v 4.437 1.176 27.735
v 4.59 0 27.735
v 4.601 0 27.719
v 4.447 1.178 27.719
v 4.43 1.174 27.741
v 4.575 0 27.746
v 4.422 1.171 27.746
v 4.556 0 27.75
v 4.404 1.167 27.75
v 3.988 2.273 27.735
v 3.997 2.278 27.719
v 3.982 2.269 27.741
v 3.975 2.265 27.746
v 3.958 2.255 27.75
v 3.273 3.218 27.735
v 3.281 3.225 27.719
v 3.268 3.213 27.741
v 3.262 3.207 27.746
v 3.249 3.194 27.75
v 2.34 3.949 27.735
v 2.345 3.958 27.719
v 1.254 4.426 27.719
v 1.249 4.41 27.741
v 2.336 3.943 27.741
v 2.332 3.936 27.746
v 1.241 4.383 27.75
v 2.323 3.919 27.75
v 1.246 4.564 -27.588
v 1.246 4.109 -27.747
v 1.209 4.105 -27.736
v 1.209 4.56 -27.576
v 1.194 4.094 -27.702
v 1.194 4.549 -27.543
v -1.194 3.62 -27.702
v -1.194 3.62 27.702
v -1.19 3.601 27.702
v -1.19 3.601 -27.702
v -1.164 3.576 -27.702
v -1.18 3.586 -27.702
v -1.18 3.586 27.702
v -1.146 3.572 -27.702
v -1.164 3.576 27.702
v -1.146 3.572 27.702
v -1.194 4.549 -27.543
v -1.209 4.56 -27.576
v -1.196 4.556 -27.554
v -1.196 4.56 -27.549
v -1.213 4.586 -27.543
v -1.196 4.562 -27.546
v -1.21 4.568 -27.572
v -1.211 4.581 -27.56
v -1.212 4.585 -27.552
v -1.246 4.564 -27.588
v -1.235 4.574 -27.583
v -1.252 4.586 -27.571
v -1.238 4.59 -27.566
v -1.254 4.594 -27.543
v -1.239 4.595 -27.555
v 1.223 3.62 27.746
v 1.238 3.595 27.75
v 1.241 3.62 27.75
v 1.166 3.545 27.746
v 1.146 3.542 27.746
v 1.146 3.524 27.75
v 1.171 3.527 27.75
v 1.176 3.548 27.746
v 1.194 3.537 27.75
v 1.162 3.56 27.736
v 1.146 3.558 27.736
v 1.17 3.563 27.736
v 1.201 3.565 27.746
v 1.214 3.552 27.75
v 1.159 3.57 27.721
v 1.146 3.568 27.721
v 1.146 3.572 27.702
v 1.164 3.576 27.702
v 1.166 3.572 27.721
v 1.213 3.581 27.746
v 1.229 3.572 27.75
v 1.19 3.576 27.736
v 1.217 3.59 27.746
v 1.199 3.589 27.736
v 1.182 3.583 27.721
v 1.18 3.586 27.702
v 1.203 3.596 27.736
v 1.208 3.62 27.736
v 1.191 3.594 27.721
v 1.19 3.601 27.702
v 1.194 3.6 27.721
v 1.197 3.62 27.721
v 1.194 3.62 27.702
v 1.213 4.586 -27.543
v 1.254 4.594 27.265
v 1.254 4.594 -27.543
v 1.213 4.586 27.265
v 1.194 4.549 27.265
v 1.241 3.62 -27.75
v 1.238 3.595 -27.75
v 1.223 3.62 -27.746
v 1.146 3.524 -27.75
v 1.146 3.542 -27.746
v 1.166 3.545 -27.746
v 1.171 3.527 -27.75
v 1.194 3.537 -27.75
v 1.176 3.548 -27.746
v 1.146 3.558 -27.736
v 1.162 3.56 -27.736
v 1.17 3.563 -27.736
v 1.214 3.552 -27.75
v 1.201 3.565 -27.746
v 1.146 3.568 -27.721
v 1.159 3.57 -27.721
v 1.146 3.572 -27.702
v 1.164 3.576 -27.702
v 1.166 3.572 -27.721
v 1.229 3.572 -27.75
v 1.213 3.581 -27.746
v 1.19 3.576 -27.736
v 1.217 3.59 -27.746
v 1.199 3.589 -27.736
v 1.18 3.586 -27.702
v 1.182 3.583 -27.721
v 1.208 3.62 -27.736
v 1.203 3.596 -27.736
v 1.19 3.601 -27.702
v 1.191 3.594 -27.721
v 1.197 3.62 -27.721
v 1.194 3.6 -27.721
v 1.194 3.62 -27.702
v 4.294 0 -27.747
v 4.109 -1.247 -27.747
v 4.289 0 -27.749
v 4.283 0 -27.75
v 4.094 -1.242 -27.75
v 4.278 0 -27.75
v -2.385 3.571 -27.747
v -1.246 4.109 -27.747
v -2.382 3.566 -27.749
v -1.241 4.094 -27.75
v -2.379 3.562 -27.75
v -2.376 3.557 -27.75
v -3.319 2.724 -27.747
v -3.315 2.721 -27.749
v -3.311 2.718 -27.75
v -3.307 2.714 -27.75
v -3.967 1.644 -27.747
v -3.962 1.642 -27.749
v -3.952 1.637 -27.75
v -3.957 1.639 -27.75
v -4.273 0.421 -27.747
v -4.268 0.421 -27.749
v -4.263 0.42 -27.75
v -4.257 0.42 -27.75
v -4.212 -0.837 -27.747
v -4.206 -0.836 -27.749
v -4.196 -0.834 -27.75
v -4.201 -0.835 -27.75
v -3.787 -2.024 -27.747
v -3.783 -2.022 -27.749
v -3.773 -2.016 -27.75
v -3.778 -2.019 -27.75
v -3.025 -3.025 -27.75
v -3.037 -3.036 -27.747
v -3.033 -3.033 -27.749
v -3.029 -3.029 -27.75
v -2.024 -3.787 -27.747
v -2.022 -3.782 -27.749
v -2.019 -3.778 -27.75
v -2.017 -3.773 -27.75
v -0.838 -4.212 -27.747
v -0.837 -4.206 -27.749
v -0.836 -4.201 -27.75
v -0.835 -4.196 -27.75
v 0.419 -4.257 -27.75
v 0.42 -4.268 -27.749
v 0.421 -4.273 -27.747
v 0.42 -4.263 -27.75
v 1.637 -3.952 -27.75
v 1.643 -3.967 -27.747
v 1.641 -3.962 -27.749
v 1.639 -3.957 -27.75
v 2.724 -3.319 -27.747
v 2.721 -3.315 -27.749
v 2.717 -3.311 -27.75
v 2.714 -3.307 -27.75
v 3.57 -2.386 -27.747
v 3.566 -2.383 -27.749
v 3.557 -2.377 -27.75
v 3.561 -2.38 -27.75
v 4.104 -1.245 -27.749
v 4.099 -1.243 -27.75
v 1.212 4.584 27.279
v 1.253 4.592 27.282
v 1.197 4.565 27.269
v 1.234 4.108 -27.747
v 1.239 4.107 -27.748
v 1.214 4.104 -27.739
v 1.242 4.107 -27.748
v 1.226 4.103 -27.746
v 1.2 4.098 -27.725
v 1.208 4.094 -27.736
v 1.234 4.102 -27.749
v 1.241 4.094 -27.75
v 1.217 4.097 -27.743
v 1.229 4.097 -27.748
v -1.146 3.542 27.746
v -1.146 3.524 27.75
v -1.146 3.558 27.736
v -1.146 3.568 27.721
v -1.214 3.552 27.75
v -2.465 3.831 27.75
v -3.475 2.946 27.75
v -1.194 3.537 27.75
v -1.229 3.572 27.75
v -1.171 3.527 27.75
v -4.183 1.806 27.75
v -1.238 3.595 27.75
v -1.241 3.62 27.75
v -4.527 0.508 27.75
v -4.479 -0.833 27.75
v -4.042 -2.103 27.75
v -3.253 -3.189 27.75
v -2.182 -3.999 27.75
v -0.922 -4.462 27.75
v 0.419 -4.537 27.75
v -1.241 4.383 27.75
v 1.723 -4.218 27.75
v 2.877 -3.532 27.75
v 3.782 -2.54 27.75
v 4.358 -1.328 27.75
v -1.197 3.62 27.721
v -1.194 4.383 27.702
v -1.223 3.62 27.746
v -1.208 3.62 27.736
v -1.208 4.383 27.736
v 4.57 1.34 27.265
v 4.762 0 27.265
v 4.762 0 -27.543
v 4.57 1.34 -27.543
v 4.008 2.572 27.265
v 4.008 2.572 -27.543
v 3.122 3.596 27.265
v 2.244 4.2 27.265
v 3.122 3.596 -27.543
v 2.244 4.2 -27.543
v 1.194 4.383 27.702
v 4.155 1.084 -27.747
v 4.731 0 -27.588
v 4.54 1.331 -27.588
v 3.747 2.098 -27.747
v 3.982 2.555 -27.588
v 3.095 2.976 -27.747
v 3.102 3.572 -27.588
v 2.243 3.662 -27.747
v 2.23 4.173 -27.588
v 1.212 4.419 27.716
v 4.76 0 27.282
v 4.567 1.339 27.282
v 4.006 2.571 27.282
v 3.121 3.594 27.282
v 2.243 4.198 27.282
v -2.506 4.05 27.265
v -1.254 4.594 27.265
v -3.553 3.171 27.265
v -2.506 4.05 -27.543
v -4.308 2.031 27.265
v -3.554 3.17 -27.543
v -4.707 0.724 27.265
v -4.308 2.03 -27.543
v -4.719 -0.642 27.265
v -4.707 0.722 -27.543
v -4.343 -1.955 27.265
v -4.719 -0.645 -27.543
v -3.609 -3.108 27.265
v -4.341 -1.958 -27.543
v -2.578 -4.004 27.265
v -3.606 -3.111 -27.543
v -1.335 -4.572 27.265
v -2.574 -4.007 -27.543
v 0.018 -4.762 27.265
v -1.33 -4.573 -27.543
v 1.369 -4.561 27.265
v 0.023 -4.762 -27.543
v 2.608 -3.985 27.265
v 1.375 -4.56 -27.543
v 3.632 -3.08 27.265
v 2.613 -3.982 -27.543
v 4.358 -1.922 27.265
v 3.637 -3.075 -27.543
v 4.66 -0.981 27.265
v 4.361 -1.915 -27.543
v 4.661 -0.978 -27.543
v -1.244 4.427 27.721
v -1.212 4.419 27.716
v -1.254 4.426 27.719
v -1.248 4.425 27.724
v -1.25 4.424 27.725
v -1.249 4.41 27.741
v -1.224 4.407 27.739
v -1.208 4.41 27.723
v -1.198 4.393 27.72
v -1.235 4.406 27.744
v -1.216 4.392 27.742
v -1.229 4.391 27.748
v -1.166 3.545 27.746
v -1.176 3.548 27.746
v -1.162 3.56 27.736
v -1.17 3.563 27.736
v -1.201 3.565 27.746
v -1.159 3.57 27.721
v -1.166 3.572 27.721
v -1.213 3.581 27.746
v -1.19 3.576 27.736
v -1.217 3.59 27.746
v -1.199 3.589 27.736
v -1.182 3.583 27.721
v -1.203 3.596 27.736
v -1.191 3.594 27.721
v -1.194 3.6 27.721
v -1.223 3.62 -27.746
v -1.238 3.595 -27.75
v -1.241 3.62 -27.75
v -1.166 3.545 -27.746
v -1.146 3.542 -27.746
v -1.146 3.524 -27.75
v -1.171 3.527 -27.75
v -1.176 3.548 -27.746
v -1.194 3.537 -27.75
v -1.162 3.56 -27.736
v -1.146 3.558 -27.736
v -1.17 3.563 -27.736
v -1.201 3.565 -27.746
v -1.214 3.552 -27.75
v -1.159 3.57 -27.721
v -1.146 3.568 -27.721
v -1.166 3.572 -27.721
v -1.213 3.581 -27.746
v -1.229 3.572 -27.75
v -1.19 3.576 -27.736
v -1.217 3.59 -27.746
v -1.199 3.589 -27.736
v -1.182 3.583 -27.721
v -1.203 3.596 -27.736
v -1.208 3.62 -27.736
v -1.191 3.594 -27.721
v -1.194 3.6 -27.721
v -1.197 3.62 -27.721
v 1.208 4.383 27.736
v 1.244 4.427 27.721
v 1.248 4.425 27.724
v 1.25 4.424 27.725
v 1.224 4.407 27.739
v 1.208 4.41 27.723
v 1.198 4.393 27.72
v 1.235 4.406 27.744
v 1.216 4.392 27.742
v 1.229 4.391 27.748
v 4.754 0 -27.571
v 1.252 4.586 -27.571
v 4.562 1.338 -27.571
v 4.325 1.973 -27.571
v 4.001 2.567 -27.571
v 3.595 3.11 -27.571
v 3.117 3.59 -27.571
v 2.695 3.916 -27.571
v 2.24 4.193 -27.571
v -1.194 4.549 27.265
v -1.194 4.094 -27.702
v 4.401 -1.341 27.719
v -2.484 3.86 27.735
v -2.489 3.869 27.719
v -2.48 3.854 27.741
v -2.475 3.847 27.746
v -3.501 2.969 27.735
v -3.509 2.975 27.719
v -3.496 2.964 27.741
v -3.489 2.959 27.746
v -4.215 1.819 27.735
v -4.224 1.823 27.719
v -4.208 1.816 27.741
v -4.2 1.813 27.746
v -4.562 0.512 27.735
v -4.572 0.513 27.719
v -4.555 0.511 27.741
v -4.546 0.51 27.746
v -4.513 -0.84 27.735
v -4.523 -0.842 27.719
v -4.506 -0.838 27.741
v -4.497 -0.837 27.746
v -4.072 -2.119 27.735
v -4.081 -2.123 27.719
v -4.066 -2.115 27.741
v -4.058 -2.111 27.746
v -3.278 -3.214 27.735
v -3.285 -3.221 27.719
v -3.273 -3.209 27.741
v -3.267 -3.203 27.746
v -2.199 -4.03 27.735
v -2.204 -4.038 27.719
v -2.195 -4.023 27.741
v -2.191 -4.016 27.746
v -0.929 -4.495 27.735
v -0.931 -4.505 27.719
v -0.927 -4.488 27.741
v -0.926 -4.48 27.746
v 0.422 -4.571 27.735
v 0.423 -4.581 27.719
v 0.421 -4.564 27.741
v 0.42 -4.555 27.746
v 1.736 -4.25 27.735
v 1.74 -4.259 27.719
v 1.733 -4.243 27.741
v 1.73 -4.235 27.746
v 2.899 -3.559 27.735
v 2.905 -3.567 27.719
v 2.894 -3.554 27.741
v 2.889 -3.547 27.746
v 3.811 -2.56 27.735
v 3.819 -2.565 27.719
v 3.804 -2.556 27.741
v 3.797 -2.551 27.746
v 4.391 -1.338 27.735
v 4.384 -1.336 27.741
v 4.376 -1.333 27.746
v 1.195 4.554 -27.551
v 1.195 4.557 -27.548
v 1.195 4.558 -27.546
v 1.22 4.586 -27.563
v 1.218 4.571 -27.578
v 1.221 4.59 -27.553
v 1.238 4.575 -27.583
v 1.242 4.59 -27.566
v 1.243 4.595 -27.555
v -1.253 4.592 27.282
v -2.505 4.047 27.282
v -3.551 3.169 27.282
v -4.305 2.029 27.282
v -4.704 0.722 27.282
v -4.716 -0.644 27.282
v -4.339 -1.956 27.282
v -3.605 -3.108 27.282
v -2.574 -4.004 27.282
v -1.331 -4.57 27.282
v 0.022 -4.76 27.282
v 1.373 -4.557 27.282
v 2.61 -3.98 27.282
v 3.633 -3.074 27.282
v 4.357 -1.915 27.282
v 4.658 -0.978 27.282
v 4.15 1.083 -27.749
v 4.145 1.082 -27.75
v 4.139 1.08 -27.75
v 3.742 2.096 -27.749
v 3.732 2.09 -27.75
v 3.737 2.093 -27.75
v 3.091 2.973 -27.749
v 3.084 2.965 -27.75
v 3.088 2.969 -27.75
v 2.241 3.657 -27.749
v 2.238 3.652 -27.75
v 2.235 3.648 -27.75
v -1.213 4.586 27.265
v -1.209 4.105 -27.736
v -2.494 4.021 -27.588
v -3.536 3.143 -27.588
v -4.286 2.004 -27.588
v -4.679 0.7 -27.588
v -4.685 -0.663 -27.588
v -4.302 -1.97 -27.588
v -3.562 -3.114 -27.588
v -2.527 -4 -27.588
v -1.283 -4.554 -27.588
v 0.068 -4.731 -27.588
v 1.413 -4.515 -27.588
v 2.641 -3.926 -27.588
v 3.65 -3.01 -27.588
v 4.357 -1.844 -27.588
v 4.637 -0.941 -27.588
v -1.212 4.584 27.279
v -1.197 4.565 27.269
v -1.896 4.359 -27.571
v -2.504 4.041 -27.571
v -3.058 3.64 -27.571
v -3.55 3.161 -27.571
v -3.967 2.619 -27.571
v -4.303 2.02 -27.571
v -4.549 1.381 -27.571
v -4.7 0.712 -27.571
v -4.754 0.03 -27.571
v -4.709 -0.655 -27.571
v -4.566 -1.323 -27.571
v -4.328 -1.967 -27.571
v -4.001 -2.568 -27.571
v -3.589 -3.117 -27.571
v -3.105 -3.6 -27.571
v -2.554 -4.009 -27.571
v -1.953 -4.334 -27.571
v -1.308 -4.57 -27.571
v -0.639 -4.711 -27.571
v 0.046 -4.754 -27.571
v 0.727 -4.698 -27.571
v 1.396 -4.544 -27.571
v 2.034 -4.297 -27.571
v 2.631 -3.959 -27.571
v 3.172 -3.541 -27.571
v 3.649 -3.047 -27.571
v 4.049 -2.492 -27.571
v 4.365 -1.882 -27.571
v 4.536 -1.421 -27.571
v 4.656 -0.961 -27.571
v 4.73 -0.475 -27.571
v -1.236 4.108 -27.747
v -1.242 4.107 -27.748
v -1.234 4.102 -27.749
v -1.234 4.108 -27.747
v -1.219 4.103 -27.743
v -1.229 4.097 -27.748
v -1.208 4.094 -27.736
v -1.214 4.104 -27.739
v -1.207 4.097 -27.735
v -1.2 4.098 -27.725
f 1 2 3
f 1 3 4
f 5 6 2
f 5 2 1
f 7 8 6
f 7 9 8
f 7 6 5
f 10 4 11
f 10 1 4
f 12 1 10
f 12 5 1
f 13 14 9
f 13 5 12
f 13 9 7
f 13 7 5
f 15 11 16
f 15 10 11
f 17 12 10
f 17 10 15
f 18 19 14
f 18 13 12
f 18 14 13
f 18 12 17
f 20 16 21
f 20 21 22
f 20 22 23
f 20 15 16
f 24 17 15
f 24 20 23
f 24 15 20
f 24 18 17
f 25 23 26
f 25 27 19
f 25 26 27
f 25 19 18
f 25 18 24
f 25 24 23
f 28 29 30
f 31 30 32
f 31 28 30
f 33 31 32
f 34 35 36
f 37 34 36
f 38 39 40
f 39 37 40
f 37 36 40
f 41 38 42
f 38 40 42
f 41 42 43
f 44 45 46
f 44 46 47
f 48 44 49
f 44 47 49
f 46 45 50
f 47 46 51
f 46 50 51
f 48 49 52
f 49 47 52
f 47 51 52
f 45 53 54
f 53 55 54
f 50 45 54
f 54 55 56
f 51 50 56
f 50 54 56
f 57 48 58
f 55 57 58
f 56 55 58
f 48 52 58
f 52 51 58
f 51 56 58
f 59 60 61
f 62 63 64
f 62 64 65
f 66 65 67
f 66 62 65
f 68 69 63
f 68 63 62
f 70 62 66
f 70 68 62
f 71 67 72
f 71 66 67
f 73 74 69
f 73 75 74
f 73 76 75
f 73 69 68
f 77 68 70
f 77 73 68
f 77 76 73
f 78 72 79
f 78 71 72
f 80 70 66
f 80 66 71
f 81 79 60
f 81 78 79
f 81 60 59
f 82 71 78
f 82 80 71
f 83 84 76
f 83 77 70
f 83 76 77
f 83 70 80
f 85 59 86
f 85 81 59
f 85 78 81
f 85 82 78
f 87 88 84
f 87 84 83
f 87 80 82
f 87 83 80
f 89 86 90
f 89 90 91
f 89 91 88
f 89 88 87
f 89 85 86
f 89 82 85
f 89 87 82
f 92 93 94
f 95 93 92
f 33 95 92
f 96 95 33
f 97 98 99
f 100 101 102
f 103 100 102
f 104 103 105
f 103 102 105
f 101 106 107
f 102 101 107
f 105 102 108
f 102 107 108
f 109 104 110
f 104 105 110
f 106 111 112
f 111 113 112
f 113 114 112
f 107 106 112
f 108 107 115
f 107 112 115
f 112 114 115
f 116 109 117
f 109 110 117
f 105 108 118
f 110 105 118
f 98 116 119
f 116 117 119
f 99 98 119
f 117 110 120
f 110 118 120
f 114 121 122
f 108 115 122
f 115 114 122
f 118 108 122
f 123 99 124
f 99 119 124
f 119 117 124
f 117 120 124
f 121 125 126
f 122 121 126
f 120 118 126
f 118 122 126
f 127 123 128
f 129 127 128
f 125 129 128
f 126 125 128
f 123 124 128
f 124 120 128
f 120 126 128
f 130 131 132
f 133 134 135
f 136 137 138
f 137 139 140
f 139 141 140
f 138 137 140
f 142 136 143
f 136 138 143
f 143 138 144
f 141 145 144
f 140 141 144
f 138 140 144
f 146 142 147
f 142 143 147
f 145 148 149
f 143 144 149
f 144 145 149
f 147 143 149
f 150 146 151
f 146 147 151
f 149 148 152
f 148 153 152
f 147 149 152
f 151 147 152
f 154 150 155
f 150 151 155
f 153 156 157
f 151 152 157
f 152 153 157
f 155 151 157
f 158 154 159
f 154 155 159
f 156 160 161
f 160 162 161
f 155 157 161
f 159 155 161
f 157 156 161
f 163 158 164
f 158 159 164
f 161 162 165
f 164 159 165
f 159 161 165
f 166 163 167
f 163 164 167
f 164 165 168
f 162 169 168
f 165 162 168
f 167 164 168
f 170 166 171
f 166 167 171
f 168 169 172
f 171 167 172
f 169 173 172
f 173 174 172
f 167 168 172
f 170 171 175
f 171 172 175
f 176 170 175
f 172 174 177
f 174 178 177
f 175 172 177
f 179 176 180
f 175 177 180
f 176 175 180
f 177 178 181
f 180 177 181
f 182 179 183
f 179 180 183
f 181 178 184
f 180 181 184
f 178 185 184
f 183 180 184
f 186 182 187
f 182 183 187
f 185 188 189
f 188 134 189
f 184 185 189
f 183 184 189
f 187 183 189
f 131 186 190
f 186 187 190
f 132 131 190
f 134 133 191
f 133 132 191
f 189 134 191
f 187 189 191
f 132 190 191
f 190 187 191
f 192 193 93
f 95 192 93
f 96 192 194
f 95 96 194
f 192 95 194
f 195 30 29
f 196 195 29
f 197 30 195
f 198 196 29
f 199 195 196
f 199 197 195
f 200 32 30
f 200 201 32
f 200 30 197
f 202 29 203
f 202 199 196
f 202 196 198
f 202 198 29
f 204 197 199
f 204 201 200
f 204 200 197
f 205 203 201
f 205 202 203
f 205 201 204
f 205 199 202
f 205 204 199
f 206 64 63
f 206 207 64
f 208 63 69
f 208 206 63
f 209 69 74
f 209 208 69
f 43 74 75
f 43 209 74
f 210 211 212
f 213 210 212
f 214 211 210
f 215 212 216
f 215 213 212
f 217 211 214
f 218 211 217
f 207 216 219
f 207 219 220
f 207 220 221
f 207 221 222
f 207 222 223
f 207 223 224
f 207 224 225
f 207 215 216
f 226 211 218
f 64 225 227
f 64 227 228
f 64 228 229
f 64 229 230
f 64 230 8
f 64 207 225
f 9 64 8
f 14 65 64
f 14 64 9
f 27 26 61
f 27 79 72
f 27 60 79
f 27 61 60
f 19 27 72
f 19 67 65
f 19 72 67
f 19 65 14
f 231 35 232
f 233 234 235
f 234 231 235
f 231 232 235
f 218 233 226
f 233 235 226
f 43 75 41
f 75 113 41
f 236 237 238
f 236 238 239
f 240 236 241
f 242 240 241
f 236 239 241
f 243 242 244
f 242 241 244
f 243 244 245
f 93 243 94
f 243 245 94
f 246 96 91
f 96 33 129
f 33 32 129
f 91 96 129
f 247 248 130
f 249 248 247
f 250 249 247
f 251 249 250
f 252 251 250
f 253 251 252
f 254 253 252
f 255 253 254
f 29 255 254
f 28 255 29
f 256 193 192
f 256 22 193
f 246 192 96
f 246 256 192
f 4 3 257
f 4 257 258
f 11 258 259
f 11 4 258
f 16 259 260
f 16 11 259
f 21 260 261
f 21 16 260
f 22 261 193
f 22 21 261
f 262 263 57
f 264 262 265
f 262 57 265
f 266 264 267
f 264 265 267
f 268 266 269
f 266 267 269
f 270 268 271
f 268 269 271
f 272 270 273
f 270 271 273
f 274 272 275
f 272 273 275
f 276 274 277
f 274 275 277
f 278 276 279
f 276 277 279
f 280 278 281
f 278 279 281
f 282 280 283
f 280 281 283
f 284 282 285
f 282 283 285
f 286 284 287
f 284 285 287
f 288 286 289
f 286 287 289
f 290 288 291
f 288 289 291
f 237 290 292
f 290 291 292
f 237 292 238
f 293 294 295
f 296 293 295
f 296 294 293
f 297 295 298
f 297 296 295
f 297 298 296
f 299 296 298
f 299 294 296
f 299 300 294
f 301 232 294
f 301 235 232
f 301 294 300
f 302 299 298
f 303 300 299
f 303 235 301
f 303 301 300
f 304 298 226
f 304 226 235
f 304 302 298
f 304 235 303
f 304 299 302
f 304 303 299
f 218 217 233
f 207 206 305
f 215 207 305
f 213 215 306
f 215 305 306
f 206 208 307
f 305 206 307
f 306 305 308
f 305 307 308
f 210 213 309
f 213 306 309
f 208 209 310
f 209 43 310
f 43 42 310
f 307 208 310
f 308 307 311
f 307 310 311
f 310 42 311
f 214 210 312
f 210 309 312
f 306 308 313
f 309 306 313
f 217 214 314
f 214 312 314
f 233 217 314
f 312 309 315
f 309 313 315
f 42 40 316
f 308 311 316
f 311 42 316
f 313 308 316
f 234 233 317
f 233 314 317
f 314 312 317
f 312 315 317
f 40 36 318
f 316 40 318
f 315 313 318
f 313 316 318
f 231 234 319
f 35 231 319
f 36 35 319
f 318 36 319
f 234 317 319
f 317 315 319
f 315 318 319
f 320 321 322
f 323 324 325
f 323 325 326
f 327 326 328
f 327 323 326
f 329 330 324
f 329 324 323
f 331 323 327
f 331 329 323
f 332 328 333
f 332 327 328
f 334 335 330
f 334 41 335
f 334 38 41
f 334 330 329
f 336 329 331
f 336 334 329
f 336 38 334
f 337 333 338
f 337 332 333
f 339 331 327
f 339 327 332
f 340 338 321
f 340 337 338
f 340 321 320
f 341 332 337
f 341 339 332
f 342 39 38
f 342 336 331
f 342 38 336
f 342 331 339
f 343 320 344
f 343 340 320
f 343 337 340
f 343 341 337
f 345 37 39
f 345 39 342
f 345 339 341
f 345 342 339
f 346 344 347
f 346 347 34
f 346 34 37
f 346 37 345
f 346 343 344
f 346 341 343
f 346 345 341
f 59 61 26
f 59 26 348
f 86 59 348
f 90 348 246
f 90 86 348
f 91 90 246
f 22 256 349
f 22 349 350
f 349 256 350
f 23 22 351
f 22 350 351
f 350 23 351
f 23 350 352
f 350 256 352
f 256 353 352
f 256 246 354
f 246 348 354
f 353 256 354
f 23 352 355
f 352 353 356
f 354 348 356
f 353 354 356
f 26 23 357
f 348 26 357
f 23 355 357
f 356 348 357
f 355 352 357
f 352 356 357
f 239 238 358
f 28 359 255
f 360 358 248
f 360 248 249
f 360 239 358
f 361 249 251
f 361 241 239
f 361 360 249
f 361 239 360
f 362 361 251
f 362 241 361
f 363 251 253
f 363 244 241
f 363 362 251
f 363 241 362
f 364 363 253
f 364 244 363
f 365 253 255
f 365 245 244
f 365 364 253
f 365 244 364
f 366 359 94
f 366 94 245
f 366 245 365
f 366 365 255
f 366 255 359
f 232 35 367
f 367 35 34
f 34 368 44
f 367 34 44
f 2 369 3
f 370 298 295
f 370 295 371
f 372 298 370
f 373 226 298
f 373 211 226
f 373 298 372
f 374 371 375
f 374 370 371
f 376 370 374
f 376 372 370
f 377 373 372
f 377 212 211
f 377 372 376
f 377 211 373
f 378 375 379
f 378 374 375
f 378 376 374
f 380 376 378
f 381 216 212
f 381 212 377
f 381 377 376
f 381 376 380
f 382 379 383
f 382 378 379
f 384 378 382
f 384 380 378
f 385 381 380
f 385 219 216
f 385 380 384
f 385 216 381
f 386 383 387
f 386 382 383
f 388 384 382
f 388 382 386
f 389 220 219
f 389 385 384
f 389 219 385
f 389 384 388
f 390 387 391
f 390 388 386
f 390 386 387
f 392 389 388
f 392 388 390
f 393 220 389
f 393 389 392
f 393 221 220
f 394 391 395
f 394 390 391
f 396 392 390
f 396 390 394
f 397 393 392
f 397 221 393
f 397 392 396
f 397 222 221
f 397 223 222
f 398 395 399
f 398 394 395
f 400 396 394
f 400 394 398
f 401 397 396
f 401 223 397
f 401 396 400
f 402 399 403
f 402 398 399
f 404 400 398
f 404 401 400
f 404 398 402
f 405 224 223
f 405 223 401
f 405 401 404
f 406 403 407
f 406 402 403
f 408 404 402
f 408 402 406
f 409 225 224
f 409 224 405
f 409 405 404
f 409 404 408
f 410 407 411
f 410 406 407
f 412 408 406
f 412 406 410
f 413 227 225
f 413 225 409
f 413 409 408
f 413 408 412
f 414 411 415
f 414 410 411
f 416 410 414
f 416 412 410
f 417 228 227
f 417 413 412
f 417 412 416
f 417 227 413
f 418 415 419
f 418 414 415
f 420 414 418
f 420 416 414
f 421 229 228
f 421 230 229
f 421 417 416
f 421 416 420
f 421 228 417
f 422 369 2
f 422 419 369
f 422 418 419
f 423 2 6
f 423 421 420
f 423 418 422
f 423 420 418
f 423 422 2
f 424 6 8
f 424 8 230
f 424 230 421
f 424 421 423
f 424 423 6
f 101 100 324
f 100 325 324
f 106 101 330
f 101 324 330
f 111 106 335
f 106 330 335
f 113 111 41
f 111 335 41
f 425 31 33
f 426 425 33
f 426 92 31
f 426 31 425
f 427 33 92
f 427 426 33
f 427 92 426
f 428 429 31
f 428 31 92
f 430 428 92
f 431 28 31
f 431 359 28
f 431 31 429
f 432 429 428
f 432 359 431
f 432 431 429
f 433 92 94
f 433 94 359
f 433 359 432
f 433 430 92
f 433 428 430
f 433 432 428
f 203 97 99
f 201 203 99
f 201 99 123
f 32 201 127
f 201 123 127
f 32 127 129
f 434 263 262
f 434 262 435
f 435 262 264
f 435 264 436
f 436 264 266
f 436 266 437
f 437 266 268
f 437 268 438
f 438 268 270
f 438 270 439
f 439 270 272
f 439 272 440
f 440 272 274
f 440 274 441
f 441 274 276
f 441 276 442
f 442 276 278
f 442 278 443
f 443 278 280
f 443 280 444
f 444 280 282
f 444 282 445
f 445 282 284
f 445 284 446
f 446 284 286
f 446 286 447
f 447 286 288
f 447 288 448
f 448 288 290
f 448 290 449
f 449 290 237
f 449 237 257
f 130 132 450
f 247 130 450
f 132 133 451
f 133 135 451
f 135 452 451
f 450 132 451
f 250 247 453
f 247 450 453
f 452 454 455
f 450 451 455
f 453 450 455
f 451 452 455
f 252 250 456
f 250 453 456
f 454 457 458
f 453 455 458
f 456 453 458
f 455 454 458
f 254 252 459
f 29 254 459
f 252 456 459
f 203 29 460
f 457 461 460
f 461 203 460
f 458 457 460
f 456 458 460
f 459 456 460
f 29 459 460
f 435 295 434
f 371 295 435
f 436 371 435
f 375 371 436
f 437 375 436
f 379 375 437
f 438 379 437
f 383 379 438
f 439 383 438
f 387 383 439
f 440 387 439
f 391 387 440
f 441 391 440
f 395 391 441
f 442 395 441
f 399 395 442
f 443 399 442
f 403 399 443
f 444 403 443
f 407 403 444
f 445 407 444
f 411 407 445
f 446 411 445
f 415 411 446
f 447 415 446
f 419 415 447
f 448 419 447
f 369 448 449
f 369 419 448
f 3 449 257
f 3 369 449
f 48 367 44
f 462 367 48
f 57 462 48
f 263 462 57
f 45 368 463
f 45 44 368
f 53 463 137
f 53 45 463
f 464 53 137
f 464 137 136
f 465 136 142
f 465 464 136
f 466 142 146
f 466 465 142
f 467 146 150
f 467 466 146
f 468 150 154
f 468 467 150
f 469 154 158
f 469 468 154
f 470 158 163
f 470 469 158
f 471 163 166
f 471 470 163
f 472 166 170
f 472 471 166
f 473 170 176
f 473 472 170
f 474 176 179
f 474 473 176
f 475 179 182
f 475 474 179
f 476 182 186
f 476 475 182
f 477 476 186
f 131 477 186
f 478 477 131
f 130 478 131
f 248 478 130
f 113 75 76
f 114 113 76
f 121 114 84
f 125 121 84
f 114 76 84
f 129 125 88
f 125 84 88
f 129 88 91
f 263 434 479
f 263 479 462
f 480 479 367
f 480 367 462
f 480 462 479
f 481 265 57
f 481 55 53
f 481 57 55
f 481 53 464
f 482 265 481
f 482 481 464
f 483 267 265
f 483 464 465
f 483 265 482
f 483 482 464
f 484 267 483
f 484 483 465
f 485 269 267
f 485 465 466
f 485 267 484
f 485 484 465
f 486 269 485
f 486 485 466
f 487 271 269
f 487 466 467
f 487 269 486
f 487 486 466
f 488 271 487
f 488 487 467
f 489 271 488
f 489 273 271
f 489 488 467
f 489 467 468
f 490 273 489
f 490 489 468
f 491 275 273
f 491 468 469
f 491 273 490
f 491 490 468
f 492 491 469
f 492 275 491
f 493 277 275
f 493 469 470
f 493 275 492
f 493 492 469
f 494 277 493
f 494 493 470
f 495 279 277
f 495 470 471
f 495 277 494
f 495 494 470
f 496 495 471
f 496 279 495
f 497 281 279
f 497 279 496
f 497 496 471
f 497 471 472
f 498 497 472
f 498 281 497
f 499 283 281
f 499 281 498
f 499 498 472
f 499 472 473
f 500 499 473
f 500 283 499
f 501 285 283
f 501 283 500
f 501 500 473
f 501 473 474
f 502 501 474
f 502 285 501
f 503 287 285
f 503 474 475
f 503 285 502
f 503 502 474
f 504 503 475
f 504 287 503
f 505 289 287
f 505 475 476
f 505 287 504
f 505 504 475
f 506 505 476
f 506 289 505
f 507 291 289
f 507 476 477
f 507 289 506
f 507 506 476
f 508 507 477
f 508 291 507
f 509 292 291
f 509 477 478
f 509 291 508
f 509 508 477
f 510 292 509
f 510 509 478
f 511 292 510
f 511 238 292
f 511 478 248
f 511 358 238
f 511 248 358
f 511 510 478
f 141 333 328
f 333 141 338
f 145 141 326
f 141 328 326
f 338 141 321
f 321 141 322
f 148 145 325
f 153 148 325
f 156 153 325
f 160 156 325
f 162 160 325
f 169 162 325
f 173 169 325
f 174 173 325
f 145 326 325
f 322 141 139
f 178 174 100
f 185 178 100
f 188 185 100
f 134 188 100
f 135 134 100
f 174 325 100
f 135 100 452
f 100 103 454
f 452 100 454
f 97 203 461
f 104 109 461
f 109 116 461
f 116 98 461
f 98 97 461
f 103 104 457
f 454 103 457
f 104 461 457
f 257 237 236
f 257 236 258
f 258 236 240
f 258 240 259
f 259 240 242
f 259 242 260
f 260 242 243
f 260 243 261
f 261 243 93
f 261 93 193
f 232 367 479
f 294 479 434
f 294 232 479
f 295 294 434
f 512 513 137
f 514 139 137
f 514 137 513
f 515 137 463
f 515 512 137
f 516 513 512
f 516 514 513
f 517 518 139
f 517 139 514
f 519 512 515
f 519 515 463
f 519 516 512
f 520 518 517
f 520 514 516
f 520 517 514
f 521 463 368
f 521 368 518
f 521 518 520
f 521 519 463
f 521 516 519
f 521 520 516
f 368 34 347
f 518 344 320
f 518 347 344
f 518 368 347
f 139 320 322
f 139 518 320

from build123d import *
from OCP.BRepFilletAPI import BRepFilletAPI_MakeChamfer

# Parameters (mm, degrees)
BOSS_EXTRUDE1_DEPTH      = 27.75
BOSS_EXTRUDE1_DEPTH_BACK = 27.75
CHAMFER1_SIZE            = 0.47625
CHAMFER1_SIZE2           = 0.173340824
FILLET1_R                = 0.047625


with BuildPart() as part:
    # Sketch3 → Boss-Extrude1 (new, two sides: drawn at the far end of the back side and taken through both)
    with BuildSketch(Plane.XY.offset(-BOSS_EXTRUDE1_DEPTH_BACK)):
        with BuildLine():
            Line((-1.1938, 3.571875), (-1.1938, 4.610449849))
            ThreePointArc((-1.1938, 4.610449849), (-2.915127249, -3.766090728), (4.7625, 0))
            ThreePointArc((4.7625, 0), (3.766090728, 2.915127249), (1.1938, 4.610449849))
            Line((1.1938, 4.610449849), (1.1938, 3.571875))
            Line((1.1938, 3.571875), (-1.1938, 3.571875))
        make_face()
    extrude(amount=BOSS_EXTRUDE1_DEPTH + BOSS_EXTRUDE1_DEPTH_BACK)

    # Chamfer1: one chamfer whose edges measure the first distance from different faces: ONE call of the kernel's chamfer builder (chamfer() names one face for all edges)
    chamfer1_edges_1 = [part.edges().sort_by_distance(p)[0] for p in [
        (-2.915127249, -3.766090728, 27.75),
    ]]
    chamfer1_side_1 = [part.faces().sort_by_distance(p)[0] for p in [
        (-2.915127249, -3.766090728, 13.875),
    ]]
    chamfer1_edges_2 = [part.edges().sort_by_distance(p)[0] for p in [
        (-2.915127249, -3.766090728, -27.75),
    ]]
    chamfer1_side_2 = [part.faces().sort_by_distance(p)[0] for p in [
        (0, -0.164578508, -27.75),
    ]]
    chamfer1 = BRepFilletAPI_MakeChamfer(part.part.solid().wrapped)
    for e in chamfer1_edges_1:
        chamfer1.Add(CHAMFER1_SIZE, CHAMFER1_SIZE2, e.wrapped, chamfer1_side_1[0].wrapped)  # the first distance lies on this face
    for e in chamfer1_edges_2:
        chamfer1.Add(CHAMFER1_SIZE, CHAMFER1_SIZE2, e.wrapped, chamfer1_side_2[0].wrapped)  # the first distance lies on this face
    add(Compound.cast(chamfer1.Shape()), mode=Mode.REPLACE)

    # Fillet1
    fillet1_edges = [part.edges().sort_by_distance(p)[0] for p in [
        (0, 3.571875, 27.75),
        (0, 3.571875, -27.75),
        (1.1938, 4.610449849, -13.788329588),
        (-1.1938, 4.610449849, -13.788329588),
        (-2.915127249, -3.766090728, 27.27375),
        (-2.915127249, -3.766090728, -27.576659176),
        (1.1938, 4.001520014, 27.75),
        (1.1938, 3.844260885, -27.75),
        (1.1938, 4.520858199, 27.511894109),
        (1.1938, 4.36360182, -27.663482035),
        (-1.1938, 3.844260885, -27.75),
        (-2.574394474, -3.42701505, -27.75),
        (-1.1938, 4.001520014, 27.75),
        (-1.1938, 4.520858199, 27.511894109),
        (-1.1938, 4.36360182, -27.663482035),
        (-2.791222288, -3.642727012, 27.75),
        (-1.1938, 3.571875, 13.875),
        (1.1938, 3.571875, 13.875),
    ]]
    fillet(fillet1_edges, radius=FILLET1_R)


solid = part.part
